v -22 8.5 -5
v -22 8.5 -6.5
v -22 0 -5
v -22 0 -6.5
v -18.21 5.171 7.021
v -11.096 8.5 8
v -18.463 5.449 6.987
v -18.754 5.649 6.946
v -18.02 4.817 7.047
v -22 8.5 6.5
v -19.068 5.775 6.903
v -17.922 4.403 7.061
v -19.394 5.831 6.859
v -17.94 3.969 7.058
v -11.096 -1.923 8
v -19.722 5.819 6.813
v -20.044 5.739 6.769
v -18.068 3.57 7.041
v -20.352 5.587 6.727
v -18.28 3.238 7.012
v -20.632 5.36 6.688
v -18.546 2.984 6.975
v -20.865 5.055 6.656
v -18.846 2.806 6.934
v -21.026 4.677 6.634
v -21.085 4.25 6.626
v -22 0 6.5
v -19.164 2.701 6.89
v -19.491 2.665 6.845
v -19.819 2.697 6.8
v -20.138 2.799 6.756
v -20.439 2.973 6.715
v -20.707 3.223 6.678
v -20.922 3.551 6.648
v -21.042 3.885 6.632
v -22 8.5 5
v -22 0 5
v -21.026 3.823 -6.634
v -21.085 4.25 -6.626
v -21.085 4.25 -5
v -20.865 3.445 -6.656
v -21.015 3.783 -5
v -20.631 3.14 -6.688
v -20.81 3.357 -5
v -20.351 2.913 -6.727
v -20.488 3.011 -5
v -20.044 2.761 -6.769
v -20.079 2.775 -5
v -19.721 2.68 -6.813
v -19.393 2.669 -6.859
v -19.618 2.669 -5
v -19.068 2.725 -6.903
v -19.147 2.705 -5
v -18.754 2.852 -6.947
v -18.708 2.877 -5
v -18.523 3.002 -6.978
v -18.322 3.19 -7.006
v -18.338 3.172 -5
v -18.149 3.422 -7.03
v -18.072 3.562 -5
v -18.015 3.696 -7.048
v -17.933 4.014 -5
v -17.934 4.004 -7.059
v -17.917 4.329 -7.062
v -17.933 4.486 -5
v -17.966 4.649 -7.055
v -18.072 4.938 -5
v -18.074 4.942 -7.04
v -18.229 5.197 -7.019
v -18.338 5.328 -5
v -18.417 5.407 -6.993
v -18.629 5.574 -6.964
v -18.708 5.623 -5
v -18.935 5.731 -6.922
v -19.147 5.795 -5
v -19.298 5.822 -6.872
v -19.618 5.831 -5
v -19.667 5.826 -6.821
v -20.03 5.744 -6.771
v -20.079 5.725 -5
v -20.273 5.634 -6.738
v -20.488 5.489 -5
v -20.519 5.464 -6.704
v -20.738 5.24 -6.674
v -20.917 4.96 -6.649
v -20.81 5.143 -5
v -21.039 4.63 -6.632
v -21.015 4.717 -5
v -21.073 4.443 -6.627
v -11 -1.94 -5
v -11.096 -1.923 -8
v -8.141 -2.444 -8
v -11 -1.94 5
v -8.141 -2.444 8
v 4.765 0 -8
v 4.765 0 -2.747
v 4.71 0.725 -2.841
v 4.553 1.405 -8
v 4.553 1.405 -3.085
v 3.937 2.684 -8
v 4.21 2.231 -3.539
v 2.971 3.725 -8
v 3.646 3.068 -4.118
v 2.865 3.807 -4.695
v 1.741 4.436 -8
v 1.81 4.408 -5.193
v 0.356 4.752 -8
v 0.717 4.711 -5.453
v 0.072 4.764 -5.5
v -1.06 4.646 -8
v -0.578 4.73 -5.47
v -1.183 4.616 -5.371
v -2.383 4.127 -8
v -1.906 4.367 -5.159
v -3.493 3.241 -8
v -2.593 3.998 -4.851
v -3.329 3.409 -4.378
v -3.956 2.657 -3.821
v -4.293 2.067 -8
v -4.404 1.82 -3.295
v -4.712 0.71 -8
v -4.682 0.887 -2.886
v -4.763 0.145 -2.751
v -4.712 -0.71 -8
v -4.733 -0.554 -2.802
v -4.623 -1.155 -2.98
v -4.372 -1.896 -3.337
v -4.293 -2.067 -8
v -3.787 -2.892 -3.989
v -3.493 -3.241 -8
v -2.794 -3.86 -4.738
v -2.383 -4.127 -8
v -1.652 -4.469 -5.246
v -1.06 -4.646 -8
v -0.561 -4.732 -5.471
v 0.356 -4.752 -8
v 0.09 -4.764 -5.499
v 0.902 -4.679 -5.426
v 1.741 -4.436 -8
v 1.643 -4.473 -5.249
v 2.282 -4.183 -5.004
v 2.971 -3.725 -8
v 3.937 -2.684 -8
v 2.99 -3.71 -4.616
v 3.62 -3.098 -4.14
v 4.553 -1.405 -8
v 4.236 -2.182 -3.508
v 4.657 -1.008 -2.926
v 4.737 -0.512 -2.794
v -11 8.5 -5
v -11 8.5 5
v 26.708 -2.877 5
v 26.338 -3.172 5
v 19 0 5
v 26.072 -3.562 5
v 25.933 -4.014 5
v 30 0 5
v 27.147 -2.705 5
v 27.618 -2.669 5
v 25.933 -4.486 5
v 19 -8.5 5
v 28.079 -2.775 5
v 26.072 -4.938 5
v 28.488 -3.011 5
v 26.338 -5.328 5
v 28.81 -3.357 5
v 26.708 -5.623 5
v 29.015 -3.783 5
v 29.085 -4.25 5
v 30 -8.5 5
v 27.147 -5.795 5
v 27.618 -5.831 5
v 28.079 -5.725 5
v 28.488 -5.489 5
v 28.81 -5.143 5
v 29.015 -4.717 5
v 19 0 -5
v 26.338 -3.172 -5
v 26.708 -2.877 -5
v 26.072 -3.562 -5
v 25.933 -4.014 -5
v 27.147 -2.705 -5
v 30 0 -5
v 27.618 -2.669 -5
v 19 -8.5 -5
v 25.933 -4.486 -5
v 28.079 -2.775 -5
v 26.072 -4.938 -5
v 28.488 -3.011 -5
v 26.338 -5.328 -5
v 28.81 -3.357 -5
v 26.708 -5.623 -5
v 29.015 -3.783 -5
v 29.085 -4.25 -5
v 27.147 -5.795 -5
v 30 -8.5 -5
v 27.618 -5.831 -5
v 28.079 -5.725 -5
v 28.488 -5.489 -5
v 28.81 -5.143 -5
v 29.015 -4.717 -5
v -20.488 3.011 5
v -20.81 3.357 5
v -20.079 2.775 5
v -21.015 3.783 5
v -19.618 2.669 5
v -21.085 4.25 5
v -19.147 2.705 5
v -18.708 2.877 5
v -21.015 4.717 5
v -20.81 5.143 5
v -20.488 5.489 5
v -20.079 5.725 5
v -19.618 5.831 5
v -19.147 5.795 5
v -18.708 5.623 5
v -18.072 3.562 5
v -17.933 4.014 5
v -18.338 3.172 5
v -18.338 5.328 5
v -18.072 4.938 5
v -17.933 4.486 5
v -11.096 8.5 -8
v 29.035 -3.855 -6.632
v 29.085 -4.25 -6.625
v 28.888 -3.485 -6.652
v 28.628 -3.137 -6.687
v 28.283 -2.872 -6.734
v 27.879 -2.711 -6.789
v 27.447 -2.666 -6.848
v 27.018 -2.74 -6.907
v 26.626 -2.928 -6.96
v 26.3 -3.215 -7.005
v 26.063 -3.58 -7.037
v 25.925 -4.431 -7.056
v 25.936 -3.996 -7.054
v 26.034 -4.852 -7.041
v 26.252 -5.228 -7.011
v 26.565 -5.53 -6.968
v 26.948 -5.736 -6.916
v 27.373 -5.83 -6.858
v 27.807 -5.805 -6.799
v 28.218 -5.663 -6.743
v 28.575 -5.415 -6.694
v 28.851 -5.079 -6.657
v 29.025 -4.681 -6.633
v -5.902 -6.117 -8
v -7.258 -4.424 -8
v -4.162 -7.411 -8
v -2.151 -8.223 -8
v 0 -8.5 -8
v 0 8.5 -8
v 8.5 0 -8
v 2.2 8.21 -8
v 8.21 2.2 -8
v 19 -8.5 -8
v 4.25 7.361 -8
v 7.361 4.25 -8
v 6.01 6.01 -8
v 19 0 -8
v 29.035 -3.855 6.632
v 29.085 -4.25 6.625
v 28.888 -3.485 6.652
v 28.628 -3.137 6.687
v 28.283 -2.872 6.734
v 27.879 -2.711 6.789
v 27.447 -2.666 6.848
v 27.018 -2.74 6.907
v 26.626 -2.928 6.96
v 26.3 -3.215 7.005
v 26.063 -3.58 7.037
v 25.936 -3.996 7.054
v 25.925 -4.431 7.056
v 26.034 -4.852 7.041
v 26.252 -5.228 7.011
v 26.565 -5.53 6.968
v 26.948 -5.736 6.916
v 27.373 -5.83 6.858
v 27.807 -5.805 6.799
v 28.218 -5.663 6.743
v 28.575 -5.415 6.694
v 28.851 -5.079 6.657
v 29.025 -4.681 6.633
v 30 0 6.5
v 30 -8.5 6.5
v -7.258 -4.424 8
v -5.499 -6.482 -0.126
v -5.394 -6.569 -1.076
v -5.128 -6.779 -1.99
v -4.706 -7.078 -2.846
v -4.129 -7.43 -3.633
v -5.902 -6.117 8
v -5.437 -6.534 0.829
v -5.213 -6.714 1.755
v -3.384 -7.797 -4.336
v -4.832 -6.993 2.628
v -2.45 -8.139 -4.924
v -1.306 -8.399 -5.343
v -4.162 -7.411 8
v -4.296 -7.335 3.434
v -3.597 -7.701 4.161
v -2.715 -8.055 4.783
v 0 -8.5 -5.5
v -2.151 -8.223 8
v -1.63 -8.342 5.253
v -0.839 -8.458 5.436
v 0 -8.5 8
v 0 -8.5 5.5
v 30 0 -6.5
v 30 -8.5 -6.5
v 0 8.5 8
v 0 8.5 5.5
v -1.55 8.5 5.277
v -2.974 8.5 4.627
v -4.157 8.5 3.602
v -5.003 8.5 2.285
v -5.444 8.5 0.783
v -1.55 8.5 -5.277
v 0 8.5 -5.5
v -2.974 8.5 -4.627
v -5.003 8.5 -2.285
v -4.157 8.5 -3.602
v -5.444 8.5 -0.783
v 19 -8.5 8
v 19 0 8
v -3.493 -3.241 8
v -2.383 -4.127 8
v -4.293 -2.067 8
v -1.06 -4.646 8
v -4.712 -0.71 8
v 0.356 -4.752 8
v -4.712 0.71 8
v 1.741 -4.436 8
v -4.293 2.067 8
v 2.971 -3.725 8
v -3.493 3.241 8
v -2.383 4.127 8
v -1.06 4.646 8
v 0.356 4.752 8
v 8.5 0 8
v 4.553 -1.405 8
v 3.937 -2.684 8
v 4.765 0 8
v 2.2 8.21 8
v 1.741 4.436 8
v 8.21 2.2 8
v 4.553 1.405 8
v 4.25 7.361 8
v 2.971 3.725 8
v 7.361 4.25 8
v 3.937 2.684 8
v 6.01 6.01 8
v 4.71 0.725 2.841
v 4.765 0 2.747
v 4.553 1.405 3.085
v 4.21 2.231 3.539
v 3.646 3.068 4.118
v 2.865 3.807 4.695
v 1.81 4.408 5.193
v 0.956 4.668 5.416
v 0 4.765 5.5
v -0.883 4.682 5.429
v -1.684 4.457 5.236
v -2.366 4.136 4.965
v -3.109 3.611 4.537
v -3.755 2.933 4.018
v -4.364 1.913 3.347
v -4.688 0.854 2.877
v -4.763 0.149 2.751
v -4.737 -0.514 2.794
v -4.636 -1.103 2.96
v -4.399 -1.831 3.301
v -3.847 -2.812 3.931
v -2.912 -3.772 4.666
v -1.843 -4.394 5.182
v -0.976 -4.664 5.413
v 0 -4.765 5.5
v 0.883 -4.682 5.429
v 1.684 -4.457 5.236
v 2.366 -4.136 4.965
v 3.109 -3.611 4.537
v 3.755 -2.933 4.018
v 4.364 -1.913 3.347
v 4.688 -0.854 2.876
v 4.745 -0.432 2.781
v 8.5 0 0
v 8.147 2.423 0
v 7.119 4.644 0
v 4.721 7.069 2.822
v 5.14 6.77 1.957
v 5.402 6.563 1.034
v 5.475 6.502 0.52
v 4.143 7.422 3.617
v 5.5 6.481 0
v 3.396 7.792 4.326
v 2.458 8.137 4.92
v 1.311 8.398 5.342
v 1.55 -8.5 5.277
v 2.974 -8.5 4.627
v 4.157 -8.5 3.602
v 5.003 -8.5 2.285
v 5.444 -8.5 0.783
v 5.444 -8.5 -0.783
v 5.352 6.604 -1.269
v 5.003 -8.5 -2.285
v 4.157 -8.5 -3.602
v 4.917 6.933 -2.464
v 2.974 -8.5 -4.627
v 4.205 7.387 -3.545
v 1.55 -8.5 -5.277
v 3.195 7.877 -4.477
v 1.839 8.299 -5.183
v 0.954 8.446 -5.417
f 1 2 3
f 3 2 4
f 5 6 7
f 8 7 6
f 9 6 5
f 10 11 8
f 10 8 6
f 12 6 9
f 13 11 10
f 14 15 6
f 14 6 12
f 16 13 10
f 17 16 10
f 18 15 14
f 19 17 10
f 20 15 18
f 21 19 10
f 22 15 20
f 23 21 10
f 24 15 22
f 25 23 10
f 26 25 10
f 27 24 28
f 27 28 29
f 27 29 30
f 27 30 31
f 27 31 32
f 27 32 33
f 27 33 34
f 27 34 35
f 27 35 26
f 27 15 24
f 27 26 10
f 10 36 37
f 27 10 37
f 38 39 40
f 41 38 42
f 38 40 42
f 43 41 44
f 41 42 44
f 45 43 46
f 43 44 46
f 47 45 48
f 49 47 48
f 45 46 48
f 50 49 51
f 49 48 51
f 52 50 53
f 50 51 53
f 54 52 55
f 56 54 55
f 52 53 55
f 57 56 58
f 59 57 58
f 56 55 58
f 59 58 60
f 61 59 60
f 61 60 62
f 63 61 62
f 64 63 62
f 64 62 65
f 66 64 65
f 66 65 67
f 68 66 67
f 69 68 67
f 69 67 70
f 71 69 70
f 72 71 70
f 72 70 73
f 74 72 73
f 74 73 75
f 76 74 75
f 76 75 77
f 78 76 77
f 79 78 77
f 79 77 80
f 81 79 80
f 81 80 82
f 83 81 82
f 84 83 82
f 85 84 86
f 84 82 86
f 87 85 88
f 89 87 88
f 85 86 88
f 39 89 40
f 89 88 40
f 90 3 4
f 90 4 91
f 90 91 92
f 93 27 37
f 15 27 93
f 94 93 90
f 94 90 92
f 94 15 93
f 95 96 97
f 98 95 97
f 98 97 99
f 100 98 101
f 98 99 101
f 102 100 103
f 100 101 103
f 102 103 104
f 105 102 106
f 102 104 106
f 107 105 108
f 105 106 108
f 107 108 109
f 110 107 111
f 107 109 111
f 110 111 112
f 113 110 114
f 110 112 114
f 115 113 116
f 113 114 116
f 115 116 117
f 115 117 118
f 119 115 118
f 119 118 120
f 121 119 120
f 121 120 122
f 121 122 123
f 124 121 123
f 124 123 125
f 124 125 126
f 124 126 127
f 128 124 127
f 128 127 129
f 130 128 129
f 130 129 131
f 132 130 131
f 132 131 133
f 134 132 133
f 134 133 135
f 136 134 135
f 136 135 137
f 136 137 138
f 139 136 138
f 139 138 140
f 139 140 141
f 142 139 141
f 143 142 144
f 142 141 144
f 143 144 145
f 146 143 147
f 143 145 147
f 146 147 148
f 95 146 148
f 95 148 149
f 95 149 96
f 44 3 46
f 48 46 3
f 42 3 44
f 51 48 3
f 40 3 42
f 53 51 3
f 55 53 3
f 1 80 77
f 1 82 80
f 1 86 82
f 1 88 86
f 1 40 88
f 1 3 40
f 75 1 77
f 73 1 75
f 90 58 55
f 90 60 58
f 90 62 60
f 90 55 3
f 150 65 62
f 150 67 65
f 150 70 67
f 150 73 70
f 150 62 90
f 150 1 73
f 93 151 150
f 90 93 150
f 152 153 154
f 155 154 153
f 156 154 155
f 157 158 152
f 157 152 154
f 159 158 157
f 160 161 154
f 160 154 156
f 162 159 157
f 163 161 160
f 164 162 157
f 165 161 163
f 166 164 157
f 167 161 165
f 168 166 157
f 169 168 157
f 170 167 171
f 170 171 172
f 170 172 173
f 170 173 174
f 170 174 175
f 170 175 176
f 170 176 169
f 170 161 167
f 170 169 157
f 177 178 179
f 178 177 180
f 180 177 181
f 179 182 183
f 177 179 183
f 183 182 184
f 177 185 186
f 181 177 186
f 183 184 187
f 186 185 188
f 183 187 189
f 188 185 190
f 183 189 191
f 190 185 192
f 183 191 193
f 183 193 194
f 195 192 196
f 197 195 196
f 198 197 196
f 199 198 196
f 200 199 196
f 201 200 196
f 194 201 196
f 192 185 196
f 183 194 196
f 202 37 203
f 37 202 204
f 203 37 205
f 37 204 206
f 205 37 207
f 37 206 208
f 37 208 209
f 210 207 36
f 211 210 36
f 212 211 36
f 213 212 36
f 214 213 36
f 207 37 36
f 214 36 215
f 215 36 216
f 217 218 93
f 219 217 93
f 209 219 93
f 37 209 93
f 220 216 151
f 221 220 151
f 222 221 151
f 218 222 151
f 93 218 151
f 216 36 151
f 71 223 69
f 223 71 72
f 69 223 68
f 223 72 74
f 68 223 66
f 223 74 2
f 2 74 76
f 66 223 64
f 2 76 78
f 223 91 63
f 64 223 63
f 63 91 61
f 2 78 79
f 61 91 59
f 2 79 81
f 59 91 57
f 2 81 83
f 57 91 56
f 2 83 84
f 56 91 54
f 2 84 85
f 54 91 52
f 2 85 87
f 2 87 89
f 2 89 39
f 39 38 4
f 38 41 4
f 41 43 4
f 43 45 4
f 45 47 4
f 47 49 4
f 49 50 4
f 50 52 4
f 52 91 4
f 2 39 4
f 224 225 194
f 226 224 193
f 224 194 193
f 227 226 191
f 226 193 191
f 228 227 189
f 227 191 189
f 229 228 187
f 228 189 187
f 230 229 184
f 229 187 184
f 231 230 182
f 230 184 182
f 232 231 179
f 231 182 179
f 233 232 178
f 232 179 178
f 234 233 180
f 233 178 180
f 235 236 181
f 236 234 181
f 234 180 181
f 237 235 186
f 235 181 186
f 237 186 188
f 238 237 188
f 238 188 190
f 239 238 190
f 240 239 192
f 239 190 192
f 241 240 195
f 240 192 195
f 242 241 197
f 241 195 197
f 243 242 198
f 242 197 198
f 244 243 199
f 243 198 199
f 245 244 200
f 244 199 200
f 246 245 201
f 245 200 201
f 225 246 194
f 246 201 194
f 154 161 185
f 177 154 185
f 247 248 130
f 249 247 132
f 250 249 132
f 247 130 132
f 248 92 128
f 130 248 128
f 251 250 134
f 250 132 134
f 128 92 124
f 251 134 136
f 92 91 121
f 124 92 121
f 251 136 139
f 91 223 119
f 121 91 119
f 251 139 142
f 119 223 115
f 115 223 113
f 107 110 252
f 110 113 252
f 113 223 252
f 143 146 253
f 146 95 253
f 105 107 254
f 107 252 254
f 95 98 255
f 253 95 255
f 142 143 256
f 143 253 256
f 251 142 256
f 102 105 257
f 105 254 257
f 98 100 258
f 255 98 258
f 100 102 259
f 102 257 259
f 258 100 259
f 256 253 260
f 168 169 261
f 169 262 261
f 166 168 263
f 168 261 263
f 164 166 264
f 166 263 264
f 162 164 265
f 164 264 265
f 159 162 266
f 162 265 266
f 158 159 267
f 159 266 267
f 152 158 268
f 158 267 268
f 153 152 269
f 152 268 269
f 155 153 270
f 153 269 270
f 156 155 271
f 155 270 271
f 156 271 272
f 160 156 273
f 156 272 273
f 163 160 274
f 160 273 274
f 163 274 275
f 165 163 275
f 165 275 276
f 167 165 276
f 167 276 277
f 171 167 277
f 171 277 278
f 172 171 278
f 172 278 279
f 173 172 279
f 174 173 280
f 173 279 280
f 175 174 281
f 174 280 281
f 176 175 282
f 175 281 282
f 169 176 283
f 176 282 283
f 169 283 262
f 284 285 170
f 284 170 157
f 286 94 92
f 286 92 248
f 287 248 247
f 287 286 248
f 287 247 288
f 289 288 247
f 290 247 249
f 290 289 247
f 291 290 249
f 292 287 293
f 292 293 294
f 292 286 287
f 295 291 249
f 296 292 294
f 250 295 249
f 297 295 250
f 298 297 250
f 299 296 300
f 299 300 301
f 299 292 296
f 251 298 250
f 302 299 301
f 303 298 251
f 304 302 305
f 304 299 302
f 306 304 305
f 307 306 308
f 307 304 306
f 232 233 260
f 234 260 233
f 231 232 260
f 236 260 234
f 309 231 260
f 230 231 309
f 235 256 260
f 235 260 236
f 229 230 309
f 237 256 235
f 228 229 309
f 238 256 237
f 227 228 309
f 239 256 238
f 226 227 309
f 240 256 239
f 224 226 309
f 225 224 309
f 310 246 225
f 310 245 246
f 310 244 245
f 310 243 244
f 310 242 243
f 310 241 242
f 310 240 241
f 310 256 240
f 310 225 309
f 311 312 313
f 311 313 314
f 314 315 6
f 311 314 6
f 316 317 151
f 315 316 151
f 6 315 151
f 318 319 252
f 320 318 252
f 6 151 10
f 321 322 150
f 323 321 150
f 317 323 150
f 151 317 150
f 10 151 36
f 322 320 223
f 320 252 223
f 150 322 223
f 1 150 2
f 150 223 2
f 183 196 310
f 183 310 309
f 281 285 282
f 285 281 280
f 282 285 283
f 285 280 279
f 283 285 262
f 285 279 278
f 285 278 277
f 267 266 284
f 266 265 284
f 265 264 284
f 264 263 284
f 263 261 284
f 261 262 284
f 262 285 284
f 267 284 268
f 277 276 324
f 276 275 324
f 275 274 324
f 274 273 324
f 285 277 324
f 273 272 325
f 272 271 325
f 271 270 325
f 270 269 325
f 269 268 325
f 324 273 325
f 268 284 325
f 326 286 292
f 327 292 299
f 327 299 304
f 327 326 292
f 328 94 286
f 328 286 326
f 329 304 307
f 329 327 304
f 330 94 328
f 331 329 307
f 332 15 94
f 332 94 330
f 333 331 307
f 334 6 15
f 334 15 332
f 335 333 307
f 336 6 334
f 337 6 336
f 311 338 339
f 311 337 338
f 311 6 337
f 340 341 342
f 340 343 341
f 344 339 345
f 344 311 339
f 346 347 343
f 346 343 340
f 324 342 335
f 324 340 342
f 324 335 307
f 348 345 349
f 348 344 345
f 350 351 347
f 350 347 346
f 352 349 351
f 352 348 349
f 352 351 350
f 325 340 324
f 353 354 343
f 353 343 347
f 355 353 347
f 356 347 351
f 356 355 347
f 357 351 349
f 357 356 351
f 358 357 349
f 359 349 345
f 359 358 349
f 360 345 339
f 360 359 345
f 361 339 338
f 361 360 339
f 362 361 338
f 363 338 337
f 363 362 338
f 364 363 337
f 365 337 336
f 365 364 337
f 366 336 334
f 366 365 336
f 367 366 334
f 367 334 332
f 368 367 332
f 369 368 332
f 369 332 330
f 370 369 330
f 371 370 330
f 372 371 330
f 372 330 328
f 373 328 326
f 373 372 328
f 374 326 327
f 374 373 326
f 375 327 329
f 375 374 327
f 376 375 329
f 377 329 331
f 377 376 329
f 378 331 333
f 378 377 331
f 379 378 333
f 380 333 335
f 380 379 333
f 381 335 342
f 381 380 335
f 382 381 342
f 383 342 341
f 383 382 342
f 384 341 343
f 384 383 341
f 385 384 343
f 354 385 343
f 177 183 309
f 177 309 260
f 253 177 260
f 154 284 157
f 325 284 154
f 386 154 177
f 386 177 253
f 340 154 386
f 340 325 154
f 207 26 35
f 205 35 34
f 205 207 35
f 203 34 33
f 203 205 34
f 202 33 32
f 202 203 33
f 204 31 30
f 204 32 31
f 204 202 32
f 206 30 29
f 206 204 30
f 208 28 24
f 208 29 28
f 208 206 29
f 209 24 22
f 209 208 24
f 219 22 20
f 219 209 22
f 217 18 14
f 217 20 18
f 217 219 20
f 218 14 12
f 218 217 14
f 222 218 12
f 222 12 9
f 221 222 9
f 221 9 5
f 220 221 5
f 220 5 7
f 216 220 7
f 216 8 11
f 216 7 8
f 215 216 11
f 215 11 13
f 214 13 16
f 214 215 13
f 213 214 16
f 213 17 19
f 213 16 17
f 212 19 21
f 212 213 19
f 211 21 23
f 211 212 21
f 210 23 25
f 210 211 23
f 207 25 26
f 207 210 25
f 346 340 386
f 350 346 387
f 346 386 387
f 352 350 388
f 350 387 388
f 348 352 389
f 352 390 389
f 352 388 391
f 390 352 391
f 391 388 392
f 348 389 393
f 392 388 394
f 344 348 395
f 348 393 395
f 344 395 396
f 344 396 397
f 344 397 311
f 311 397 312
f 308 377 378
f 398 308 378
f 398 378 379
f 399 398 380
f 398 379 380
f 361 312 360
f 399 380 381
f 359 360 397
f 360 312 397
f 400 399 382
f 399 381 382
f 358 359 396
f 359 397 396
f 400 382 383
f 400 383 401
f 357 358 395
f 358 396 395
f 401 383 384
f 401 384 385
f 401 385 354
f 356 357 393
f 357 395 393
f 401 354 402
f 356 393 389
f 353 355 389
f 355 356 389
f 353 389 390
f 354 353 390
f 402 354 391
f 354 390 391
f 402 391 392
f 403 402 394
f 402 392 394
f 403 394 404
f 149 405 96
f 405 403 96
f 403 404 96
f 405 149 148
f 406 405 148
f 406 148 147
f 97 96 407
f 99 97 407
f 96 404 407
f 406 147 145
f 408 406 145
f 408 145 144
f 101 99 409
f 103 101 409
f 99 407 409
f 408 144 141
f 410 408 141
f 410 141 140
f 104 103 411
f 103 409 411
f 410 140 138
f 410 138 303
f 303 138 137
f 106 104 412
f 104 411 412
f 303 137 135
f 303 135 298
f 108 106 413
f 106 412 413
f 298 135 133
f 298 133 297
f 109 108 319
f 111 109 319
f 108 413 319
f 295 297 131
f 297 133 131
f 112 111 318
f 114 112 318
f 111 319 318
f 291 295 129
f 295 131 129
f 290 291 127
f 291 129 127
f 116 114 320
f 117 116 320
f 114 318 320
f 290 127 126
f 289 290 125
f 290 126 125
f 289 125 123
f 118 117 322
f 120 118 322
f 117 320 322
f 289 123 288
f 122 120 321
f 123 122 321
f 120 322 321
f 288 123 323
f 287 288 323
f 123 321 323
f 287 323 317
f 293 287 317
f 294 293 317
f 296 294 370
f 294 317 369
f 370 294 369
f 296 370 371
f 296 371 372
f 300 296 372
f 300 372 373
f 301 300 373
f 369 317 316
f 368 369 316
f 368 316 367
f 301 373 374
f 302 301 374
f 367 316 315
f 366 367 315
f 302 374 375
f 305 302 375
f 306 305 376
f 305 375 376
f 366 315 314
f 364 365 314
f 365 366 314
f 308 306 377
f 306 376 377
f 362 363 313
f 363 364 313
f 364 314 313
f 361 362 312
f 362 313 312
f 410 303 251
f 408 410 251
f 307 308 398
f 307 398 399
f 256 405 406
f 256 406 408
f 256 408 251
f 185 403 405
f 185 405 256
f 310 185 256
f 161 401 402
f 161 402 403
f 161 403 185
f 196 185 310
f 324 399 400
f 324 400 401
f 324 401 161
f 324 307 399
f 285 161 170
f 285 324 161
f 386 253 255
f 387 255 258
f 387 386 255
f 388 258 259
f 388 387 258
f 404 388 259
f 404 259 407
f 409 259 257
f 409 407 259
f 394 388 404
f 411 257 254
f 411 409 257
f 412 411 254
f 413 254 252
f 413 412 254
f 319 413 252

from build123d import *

# Parameters (mm, degrees)
SKETCH1_R           = 8.5
SKETCH1_R_2         = 4.765
BOSS_EXTRUDE1_DEPTH = 8
SKETCH2_R           = 5.5
CUT_EXTRUDE1_DEPTH  = 36.397740041
SKETCH7_W           = 11
SKETCH7_H           = 10
CUT_EXTRUDE3_DEPTH  = 16
SKETCH14_R          = 1.585
CUT_EXTRUDE5_DEPTH  = 22
SKETCH15_W          = 11
SKETCH15_H          = 10
CUT_EXTRUDE6_DEPTH  = 22


with BuildPart() as part:
    # Sketch1 → Boss-Extrude1 (new, symmetric)
    # profile 1 of 3: a face of its own
    with BuildSketch(Plane.XY):
        with BuildLine():
            Line((-22, 0), (-8.141153884, -2.443688492))
            ThreePointArc((-8.141153884, -2.443688492), (-6.819873612, 5.073393727), (0, 8.5))
            Line((0, 8.5), (-22, 8.5))
            Line((-22, 8.5), (-22, 0))
        make_face()
    # profile 2 of 3: a face of its own
    with BuildSketch(Plane.XY):
        Circle(SKETCH1_R)
        Circle(SKETCH1_R_2, mode=Mode.SUBTRACT)
    # profile 3 of 3: a face of its own
    with BuildSketch(Plane.XY):
        with BuildLine():
            ThreePointArc((8.5, 0), (6.01040764, -6.01040764), (0, -8.5))
            Line((0, -8.5), (30, -8.5))
            Line((30, -8.5), (30, 0))
            Line((30, 0), (8.5, 0))
        make_face()
    extrude(amount=BOSS_EXTRUDE1_DEPTH, both=True)

    # Sketch2 → Cut-Extrude1 (cut, through all)
    with BuildSketch(Plane(origin=(0, 8.5, 0), x_dir=(1, 0, 0), z_dir=(0, 1, 0))):
        with Locations(Location((0, 0, 0), (0, 0, 270))):
            Circle(SKETCH2_R)
    extrude(amount=-CUT_EXTRUDE1_DEPTH, mode=Mode.SUBTRACT)

    # Sketch7 → Cut-Extrude3 (cut)
    with BuildSketch(Plane(origin=(0, 8.5, 0), x_dir=(1, 0, 0), z_dir=(0, 1, 0))):
        with Locations((-16.5, 0)):
            Rectangle(SKETCH7_W, SKETCH7_H)
    extrude(amount=-CUT_EXTRUDE3_DEPTH, mode=Mode.SUBTRACT)

    # Sketch13 → Cut-Loft6 section 0
    with BuildSketch(Plane(origin=(0, 8.5, 0), x_dir=(1, 0, 0), z_dir=(0, 1, 0))):
        with BuildLine():
            Line((-22, -6.5), (-22, -8))
            Line((-22, -8), (-11.095577143, -8))
            Line((-11.095577143, -8), (-22, -6.5))
        make_face()
    # Sketch12 → Cut-Loft6 section 1
    with BuildSketch(Plane(origin=(-0.663381171, -3.762221577, 0), x_dir=(0.9848077530122088, -0.17364817766692656, 0), z_dir=(-0.17364817766692653, -0.9848077530122087, 0))):
        with BuildLine():
            Line((-10.59312941, 8), (-21.665770566, 6.5))
            Line((-21.665770566, 6.5), (-21.665770566, 8))
            Line((-21.665770566, 8), (-10.59312941, 8))
        make_face()
    cut_loft6 = loft(mode=Mode.SUBTRACT)

    # Mirror1: Cut-Loft6 across plane
    add(cut_loft6.mirror(Plane.XY), mode=Mode.SUBTRACT)

    # Sketch14 → Cut-Extrude5 (cut, symmetric)
    with BuildSketch(Plane.XY):
        with Locations(Location((-19.5, 4.25, 0), (0, 0, 180))):
            Circle(SKETCH14_R)
        with Locations((27.5, -4.25)):
            Circle(SKETCH14_R)
    extrude(amount=CUT_EXTRUDE5_DEPTH, both=True, mode=Mode.SUBTRACT)

    # Sketch15 → Cut-Extrude6 (cut, symmetric)
    with BuildSketch(Plane(origin=(0, 0, 0), x_dir=(1, 0, 0), z_dir=(0, 1, 0))):
        Polygon((30, 8), (19, 8), (30, 6.5), align=None)
        with Locations((24.5, 0)):
            Rectangle(SKETCH15_W, SKETCH15_H)
        Polygon((30, -6.5), (19, -8), (30, -8), align=None)
    extrude(amount=CUT_EXTRUDE6_DEPTH, both=True, mode=Mode.SUBTRACT)


solid = part.part
